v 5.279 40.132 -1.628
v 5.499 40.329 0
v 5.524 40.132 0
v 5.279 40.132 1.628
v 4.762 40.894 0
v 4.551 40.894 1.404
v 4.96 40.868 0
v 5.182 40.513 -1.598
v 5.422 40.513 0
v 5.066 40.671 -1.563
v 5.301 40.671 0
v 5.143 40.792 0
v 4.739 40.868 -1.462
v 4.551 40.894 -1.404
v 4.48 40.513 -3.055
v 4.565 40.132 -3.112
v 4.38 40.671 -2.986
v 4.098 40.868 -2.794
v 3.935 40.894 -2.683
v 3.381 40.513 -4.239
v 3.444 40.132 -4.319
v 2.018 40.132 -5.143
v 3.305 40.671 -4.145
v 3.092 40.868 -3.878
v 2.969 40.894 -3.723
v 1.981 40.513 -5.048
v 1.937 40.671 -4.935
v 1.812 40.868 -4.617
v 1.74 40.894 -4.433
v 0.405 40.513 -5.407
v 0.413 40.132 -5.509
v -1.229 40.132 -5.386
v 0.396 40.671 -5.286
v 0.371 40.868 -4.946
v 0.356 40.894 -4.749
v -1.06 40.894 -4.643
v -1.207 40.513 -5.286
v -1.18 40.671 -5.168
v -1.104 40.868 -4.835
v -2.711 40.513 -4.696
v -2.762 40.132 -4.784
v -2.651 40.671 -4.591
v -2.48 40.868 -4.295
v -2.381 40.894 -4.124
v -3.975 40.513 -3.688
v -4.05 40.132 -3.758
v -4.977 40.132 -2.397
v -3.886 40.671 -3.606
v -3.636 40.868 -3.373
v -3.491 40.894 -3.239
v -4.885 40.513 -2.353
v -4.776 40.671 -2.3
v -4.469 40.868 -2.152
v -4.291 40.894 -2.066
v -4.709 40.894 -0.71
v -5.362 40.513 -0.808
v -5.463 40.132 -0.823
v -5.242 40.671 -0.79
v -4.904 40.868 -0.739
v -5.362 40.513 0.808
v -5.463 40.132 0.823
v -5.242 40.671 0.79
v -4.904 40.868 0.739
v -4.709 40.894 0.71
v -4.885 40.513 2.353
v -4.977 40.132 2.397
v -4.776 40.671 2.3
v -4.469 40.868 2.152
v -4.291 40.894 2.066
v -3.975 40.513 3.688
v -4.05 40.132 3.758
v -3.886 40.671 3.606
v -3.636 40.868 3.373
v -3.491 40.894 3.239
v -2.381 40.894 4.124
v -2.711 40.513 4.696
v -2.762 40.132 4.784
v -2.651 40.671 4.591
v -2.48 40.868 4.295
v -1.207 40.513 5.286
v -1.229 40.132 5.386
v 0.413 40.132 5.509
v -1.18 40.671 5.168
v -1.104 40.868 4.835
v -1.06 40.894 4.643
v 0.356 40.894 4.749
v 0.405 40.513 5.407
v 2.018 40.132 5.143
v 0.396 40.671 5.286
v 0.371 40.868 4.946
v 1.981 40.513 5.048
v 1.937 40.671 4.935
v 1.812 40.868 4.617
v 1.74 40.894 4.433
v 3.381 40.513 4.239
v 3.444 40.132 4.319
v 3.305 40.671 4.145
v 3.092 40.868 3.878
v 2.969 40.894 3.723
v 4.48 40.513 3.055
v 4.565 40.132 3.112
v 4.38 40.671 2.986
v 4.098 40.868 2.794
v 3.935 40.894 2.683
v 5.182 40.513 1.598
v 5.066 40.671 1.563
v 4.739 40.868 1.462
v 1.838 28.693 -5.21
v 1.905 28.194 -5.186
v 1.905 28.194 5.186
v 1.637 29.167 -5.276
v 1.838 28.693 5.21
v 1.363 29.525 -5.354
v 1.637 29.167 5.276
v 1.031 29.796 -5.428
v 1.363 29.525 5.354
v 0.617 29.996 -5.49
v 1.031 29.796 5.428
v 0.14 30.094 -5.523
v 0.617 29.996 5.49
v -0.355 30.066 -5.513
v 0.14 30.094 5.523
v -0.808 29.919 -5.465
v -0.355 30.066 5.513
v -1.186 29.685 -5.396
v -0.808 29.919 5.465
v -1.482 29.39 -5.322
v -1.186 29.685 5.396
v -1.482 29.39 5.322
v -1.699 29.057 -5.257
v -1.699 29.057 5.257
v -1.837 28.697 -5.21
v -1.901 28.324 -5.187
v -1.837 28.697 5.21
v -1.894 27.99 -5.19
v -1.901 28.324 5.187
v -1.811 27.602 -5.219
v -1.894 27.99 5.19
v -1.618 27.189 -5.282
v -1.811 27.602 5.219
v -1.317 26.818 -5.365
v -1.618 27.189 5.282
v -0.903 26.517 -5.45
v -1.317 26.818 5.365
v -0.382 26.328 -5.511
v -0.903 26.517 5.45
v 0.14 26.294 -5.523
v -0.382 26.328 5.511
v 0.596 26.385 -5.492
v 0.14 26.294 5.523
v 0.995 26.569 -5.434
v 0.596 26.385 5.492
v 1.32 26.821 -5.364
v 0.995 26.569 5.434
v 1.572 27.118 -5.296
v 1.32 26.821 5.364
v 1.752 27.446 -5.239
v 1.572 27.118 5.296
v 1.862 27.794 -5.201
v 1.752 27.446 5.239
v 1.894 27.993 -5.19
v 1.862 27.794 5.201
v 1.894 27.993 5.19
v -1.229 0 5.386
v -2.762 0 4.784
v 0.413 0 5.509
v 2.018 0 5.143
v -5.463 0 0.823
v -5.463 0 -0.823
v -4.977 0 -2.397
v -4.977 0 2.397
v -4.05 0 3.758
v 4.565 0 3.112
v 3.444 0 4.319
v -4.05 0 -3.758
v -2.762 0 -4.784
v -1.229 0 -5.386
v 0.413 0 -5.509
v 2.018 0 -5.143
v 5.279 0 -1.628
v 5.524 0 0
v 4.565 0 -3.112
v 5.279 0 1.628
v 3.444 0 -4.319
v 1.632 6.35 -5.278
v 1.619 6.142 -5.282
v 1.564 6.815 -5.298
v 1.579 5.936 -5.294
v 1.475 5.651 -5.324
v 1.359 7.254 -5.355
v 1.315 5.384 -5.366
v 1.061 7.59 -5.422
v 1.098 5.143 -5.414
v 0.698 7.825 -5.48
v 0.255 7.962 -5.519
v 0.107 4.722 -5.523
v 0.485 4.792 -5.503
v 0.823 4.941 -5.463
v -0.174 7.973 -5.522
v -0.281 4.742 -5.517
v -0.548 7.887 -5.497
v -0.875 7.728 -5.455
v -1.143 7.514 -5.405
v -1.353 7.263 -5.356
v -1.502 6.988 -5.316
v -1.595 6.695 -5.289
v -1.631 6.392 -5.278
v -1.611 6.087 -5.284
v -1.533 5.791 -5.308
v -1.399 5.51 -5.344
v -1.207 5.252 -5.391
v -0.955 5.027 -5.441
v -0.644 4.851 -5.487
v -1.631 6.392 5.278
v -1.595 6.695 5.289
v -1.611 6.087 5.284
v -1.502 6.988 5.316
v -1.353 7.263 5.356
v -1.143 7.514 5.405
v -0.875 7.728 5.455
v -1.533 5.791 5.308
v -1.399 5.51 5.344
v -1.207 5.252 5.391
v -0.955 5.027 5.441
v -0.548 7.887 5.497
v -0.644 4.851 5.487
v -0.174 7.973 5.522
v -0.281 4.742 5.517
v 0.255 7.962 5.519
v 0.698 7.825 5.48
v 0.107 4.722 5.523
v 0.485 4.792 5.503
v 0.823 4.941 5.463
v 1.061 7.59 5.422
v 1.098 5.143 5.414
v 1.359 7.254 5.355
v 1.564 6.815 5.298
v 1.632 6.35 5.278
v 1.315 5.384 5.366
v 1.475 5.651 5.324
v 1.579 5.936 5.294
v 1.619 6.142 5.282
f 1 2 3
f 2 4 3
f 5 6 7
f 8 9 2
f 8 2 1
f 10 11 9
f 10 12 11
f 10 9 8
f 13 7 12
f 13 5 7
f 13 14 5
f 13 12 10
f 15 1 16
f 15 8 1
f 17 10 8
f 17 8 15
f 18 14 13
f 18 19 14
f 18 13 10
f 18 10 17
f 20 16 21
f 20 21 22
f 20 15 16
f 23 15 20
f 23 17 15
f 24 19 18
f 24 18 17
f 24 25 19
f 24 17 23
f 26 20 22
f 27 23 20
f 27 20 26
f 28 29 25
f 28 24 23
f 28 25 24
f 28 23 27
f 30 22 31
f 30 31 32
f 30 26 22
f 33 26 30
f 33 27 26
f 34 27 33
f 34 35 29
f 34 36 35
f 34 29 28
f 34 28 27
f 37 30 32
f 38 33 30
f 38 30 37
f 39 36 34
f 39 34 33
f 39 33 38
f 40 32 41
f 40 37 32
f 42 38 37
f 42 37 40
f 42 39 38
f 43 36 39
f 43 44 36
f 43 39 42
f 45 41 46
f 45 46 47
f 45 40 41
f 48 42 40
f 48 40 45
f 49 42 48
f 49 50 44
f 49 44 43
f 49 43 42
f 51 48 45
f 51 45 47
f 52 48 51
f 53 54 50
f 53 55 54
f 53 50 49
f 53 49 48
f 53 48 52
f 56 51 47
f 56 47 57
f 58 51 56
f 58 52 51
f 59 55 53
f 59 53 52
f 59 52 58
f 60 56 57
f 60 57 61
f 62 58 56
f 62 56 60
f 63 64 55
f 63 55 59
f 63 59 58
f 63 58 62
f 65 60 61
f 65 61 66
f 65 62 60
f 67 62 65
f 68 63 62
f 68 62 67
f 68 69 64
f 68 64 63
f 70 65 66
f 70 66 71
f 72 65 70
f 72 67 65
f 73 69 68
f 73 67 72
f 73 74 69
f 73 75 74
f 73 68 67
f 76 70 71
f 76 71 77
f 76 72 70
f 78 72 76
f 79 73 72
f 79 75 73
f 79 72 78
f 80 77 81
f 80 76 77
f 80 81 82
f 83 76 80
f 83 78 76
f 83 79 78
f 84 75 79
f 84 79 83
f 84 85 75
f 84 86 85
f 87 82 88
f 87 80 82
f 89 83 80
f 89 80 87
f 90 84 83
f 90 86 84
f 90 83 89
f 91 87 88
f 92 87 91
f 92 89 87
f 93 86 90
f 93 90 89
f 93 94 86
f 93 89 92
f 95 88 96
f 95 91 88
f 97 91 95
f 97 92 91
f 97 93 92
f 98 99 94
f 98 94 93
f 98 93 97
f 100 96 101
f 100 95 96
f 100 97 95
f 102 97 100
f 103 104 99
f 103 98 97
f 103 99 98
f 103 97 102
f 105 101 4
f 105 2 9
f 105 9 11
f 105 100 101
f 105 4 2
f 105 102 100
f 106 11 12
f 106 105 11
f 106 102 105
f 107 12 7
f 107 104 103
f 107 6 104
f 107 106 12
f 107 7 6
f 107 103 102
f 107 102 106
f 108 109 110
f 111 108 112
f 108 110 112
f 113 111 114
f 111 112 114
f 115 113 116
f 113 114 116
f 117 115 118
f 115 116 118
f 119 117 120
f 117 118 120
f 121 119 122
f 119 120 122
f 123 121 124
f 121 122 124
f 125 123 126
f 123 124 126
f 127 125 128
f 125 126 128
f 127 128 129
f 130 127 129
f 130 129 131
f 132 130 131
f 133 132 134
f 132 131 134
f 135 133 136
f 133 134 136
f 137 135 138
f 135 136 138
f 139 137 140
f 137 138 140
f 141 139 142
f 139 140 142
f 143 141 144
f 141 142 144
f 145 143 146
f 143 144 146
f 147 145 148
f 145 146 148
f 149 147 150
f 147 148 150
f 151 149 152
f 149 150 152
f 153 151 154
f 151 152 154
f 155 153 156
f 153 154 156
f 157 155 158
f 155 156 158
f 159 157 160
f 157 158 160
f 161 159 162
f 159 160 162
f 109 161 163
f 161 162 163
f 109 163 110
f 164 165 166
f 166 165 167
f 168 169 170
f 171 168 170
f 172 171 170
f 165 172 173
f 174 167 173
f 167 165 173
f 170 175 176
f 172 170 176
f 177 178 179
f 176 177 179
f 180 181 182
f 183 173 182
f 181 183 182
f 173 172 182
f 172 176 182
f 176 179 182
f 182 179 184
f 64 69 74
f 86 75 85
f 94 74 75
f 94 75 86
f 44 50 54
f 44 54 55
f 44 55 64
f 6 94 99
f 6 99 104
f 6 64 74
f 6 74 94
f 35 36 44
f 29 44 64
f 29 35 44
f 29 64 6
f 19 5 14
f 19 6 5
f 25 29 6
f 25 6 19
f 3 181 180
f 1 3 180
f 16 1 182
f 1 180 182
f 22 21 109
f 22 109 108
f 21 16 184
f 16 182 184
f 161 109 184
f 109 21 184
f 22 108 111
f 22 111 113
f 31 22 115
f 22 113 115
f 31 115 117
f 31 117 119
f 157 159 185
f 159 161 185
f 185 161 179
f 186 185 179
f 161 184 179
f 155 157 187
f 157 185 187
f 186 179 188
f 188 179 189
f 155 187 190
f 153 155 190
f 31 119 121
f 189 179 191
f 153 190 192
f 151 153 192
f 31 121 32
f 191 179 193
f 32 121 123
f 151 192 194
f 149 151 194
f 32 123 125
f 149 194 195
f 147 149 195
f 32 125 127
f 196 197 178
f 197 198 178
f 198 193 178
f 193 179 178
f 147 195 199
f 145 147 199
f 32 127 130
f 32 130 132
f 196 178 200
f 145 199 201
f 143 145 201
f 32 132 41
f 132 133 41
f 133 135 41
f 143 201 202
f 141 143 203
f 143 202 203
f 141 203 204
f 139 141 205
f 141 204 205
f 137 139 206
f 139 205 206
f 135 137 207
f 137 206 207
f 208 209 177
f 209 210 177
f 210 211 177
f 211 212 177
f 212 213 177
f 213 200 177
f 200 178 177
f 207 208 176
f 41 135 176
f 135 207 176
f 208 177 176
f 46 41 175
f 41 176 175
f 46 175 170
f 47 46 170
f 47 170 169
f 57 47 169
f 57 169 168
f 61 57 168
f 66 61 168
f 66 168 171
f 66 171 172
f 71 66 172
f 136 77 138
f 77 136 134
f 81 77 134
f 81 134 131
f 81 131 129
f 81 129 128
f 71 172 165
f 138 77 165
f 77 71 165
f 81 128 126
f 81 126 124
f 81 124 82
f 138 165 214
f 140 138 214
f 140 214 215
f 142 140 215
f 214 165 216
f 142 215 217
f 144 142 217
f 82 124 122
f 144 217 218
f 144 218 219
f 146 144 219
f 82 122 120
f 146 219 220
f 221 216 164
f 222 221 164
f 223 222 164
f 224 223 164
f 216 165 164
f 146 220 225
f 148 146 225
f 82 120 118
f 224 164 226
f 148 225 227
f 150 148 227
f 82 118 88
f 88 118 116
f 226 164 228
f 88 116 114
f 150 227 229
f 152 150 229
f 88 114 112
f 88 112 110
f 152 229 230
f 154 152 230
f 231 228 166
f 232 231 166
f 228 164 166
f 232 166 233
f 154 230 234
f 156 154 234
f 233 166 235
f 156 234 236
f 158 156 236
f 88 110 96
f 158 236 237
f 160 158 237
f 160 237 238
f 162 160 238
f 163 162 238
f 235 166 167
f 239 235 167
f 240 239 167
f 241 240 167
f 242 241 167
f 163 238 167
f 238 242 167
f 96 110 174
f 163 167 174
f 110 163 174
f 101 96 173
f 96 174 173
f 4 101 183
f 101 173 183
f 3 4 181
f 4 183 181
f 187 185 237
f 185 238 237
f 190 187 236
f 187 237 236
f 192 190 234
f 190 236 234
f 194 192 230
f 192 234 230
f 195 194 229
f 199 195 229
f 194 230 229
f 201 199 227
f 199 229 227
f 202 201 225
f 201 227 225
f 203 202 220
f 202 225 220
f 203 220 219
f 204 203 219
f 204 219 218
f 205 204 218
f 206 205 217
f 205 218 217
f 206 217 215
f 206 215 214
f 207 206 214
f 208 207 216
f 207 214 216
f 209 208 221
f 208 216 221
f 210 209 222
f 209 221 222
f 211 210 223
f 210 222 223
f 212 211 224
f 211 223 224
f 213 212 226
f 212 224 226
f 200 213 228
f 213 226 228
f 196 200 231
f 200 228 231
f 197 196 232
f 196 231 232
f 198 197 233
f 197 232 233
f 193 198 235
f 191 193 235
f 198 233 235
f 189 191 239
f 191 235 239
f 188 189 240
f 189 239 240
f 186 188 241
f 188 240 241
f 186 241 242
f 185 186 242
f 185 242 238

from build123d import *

# Parameters (mm, degrees)
SKETCH1_R               = 5.5245
BOSS_EXTRUDE1_DEPTH     = 40.894
SKETCH2_R               = 1.905
SKETCH2_R_2             = 1.63195
CUT_EXTRUDE1_DEPTH      = 6.5245
CUT_EXTRUDE1_DEPTH_BACK = 6.5245
FILLET1_R               = 0.762


with BuildPart() as part:
    # Sketch1 → Boss-Extrude1 (new body)
    with BuildSketch(Plane(origin=(0, 0, 0), x_dir=(1, 0, 0), z_dir=(0, 1, 0))):
        Circle(SKETCH1_R)
    extrude(amount=BOSS_EXTRUDE1_DEPTH)

    # Sketch2 → Cut-Extrude1 (cut, two sides)
    with BuildSketch(Plane.XY) as cut_extrude1_sk:
        with Locations((0, 28.194)):
            Circle(SKETCH2_R)
        with Locations((0, 6.35)):
            Circle(SKETCH2_R_2)
    extrude(amount=CUT_EXTRUDE1_DEPTH, mode=Mode.SUBTRACT)
    extrude(cut_extrude1_sk.sketch, amount=-CUT_EXTRUDE1_DEPTH_BACK, mode=Mode.SUBTRACT)

    # Fillet1
    fillet1_edges = [part.edges().sort_by_distance(p)[0] for p in [
        (-5.5245, 40.894, 0),
    ]]
    fillet(fillet1_edges, radius=FILLET1_R)


solid = part.part
